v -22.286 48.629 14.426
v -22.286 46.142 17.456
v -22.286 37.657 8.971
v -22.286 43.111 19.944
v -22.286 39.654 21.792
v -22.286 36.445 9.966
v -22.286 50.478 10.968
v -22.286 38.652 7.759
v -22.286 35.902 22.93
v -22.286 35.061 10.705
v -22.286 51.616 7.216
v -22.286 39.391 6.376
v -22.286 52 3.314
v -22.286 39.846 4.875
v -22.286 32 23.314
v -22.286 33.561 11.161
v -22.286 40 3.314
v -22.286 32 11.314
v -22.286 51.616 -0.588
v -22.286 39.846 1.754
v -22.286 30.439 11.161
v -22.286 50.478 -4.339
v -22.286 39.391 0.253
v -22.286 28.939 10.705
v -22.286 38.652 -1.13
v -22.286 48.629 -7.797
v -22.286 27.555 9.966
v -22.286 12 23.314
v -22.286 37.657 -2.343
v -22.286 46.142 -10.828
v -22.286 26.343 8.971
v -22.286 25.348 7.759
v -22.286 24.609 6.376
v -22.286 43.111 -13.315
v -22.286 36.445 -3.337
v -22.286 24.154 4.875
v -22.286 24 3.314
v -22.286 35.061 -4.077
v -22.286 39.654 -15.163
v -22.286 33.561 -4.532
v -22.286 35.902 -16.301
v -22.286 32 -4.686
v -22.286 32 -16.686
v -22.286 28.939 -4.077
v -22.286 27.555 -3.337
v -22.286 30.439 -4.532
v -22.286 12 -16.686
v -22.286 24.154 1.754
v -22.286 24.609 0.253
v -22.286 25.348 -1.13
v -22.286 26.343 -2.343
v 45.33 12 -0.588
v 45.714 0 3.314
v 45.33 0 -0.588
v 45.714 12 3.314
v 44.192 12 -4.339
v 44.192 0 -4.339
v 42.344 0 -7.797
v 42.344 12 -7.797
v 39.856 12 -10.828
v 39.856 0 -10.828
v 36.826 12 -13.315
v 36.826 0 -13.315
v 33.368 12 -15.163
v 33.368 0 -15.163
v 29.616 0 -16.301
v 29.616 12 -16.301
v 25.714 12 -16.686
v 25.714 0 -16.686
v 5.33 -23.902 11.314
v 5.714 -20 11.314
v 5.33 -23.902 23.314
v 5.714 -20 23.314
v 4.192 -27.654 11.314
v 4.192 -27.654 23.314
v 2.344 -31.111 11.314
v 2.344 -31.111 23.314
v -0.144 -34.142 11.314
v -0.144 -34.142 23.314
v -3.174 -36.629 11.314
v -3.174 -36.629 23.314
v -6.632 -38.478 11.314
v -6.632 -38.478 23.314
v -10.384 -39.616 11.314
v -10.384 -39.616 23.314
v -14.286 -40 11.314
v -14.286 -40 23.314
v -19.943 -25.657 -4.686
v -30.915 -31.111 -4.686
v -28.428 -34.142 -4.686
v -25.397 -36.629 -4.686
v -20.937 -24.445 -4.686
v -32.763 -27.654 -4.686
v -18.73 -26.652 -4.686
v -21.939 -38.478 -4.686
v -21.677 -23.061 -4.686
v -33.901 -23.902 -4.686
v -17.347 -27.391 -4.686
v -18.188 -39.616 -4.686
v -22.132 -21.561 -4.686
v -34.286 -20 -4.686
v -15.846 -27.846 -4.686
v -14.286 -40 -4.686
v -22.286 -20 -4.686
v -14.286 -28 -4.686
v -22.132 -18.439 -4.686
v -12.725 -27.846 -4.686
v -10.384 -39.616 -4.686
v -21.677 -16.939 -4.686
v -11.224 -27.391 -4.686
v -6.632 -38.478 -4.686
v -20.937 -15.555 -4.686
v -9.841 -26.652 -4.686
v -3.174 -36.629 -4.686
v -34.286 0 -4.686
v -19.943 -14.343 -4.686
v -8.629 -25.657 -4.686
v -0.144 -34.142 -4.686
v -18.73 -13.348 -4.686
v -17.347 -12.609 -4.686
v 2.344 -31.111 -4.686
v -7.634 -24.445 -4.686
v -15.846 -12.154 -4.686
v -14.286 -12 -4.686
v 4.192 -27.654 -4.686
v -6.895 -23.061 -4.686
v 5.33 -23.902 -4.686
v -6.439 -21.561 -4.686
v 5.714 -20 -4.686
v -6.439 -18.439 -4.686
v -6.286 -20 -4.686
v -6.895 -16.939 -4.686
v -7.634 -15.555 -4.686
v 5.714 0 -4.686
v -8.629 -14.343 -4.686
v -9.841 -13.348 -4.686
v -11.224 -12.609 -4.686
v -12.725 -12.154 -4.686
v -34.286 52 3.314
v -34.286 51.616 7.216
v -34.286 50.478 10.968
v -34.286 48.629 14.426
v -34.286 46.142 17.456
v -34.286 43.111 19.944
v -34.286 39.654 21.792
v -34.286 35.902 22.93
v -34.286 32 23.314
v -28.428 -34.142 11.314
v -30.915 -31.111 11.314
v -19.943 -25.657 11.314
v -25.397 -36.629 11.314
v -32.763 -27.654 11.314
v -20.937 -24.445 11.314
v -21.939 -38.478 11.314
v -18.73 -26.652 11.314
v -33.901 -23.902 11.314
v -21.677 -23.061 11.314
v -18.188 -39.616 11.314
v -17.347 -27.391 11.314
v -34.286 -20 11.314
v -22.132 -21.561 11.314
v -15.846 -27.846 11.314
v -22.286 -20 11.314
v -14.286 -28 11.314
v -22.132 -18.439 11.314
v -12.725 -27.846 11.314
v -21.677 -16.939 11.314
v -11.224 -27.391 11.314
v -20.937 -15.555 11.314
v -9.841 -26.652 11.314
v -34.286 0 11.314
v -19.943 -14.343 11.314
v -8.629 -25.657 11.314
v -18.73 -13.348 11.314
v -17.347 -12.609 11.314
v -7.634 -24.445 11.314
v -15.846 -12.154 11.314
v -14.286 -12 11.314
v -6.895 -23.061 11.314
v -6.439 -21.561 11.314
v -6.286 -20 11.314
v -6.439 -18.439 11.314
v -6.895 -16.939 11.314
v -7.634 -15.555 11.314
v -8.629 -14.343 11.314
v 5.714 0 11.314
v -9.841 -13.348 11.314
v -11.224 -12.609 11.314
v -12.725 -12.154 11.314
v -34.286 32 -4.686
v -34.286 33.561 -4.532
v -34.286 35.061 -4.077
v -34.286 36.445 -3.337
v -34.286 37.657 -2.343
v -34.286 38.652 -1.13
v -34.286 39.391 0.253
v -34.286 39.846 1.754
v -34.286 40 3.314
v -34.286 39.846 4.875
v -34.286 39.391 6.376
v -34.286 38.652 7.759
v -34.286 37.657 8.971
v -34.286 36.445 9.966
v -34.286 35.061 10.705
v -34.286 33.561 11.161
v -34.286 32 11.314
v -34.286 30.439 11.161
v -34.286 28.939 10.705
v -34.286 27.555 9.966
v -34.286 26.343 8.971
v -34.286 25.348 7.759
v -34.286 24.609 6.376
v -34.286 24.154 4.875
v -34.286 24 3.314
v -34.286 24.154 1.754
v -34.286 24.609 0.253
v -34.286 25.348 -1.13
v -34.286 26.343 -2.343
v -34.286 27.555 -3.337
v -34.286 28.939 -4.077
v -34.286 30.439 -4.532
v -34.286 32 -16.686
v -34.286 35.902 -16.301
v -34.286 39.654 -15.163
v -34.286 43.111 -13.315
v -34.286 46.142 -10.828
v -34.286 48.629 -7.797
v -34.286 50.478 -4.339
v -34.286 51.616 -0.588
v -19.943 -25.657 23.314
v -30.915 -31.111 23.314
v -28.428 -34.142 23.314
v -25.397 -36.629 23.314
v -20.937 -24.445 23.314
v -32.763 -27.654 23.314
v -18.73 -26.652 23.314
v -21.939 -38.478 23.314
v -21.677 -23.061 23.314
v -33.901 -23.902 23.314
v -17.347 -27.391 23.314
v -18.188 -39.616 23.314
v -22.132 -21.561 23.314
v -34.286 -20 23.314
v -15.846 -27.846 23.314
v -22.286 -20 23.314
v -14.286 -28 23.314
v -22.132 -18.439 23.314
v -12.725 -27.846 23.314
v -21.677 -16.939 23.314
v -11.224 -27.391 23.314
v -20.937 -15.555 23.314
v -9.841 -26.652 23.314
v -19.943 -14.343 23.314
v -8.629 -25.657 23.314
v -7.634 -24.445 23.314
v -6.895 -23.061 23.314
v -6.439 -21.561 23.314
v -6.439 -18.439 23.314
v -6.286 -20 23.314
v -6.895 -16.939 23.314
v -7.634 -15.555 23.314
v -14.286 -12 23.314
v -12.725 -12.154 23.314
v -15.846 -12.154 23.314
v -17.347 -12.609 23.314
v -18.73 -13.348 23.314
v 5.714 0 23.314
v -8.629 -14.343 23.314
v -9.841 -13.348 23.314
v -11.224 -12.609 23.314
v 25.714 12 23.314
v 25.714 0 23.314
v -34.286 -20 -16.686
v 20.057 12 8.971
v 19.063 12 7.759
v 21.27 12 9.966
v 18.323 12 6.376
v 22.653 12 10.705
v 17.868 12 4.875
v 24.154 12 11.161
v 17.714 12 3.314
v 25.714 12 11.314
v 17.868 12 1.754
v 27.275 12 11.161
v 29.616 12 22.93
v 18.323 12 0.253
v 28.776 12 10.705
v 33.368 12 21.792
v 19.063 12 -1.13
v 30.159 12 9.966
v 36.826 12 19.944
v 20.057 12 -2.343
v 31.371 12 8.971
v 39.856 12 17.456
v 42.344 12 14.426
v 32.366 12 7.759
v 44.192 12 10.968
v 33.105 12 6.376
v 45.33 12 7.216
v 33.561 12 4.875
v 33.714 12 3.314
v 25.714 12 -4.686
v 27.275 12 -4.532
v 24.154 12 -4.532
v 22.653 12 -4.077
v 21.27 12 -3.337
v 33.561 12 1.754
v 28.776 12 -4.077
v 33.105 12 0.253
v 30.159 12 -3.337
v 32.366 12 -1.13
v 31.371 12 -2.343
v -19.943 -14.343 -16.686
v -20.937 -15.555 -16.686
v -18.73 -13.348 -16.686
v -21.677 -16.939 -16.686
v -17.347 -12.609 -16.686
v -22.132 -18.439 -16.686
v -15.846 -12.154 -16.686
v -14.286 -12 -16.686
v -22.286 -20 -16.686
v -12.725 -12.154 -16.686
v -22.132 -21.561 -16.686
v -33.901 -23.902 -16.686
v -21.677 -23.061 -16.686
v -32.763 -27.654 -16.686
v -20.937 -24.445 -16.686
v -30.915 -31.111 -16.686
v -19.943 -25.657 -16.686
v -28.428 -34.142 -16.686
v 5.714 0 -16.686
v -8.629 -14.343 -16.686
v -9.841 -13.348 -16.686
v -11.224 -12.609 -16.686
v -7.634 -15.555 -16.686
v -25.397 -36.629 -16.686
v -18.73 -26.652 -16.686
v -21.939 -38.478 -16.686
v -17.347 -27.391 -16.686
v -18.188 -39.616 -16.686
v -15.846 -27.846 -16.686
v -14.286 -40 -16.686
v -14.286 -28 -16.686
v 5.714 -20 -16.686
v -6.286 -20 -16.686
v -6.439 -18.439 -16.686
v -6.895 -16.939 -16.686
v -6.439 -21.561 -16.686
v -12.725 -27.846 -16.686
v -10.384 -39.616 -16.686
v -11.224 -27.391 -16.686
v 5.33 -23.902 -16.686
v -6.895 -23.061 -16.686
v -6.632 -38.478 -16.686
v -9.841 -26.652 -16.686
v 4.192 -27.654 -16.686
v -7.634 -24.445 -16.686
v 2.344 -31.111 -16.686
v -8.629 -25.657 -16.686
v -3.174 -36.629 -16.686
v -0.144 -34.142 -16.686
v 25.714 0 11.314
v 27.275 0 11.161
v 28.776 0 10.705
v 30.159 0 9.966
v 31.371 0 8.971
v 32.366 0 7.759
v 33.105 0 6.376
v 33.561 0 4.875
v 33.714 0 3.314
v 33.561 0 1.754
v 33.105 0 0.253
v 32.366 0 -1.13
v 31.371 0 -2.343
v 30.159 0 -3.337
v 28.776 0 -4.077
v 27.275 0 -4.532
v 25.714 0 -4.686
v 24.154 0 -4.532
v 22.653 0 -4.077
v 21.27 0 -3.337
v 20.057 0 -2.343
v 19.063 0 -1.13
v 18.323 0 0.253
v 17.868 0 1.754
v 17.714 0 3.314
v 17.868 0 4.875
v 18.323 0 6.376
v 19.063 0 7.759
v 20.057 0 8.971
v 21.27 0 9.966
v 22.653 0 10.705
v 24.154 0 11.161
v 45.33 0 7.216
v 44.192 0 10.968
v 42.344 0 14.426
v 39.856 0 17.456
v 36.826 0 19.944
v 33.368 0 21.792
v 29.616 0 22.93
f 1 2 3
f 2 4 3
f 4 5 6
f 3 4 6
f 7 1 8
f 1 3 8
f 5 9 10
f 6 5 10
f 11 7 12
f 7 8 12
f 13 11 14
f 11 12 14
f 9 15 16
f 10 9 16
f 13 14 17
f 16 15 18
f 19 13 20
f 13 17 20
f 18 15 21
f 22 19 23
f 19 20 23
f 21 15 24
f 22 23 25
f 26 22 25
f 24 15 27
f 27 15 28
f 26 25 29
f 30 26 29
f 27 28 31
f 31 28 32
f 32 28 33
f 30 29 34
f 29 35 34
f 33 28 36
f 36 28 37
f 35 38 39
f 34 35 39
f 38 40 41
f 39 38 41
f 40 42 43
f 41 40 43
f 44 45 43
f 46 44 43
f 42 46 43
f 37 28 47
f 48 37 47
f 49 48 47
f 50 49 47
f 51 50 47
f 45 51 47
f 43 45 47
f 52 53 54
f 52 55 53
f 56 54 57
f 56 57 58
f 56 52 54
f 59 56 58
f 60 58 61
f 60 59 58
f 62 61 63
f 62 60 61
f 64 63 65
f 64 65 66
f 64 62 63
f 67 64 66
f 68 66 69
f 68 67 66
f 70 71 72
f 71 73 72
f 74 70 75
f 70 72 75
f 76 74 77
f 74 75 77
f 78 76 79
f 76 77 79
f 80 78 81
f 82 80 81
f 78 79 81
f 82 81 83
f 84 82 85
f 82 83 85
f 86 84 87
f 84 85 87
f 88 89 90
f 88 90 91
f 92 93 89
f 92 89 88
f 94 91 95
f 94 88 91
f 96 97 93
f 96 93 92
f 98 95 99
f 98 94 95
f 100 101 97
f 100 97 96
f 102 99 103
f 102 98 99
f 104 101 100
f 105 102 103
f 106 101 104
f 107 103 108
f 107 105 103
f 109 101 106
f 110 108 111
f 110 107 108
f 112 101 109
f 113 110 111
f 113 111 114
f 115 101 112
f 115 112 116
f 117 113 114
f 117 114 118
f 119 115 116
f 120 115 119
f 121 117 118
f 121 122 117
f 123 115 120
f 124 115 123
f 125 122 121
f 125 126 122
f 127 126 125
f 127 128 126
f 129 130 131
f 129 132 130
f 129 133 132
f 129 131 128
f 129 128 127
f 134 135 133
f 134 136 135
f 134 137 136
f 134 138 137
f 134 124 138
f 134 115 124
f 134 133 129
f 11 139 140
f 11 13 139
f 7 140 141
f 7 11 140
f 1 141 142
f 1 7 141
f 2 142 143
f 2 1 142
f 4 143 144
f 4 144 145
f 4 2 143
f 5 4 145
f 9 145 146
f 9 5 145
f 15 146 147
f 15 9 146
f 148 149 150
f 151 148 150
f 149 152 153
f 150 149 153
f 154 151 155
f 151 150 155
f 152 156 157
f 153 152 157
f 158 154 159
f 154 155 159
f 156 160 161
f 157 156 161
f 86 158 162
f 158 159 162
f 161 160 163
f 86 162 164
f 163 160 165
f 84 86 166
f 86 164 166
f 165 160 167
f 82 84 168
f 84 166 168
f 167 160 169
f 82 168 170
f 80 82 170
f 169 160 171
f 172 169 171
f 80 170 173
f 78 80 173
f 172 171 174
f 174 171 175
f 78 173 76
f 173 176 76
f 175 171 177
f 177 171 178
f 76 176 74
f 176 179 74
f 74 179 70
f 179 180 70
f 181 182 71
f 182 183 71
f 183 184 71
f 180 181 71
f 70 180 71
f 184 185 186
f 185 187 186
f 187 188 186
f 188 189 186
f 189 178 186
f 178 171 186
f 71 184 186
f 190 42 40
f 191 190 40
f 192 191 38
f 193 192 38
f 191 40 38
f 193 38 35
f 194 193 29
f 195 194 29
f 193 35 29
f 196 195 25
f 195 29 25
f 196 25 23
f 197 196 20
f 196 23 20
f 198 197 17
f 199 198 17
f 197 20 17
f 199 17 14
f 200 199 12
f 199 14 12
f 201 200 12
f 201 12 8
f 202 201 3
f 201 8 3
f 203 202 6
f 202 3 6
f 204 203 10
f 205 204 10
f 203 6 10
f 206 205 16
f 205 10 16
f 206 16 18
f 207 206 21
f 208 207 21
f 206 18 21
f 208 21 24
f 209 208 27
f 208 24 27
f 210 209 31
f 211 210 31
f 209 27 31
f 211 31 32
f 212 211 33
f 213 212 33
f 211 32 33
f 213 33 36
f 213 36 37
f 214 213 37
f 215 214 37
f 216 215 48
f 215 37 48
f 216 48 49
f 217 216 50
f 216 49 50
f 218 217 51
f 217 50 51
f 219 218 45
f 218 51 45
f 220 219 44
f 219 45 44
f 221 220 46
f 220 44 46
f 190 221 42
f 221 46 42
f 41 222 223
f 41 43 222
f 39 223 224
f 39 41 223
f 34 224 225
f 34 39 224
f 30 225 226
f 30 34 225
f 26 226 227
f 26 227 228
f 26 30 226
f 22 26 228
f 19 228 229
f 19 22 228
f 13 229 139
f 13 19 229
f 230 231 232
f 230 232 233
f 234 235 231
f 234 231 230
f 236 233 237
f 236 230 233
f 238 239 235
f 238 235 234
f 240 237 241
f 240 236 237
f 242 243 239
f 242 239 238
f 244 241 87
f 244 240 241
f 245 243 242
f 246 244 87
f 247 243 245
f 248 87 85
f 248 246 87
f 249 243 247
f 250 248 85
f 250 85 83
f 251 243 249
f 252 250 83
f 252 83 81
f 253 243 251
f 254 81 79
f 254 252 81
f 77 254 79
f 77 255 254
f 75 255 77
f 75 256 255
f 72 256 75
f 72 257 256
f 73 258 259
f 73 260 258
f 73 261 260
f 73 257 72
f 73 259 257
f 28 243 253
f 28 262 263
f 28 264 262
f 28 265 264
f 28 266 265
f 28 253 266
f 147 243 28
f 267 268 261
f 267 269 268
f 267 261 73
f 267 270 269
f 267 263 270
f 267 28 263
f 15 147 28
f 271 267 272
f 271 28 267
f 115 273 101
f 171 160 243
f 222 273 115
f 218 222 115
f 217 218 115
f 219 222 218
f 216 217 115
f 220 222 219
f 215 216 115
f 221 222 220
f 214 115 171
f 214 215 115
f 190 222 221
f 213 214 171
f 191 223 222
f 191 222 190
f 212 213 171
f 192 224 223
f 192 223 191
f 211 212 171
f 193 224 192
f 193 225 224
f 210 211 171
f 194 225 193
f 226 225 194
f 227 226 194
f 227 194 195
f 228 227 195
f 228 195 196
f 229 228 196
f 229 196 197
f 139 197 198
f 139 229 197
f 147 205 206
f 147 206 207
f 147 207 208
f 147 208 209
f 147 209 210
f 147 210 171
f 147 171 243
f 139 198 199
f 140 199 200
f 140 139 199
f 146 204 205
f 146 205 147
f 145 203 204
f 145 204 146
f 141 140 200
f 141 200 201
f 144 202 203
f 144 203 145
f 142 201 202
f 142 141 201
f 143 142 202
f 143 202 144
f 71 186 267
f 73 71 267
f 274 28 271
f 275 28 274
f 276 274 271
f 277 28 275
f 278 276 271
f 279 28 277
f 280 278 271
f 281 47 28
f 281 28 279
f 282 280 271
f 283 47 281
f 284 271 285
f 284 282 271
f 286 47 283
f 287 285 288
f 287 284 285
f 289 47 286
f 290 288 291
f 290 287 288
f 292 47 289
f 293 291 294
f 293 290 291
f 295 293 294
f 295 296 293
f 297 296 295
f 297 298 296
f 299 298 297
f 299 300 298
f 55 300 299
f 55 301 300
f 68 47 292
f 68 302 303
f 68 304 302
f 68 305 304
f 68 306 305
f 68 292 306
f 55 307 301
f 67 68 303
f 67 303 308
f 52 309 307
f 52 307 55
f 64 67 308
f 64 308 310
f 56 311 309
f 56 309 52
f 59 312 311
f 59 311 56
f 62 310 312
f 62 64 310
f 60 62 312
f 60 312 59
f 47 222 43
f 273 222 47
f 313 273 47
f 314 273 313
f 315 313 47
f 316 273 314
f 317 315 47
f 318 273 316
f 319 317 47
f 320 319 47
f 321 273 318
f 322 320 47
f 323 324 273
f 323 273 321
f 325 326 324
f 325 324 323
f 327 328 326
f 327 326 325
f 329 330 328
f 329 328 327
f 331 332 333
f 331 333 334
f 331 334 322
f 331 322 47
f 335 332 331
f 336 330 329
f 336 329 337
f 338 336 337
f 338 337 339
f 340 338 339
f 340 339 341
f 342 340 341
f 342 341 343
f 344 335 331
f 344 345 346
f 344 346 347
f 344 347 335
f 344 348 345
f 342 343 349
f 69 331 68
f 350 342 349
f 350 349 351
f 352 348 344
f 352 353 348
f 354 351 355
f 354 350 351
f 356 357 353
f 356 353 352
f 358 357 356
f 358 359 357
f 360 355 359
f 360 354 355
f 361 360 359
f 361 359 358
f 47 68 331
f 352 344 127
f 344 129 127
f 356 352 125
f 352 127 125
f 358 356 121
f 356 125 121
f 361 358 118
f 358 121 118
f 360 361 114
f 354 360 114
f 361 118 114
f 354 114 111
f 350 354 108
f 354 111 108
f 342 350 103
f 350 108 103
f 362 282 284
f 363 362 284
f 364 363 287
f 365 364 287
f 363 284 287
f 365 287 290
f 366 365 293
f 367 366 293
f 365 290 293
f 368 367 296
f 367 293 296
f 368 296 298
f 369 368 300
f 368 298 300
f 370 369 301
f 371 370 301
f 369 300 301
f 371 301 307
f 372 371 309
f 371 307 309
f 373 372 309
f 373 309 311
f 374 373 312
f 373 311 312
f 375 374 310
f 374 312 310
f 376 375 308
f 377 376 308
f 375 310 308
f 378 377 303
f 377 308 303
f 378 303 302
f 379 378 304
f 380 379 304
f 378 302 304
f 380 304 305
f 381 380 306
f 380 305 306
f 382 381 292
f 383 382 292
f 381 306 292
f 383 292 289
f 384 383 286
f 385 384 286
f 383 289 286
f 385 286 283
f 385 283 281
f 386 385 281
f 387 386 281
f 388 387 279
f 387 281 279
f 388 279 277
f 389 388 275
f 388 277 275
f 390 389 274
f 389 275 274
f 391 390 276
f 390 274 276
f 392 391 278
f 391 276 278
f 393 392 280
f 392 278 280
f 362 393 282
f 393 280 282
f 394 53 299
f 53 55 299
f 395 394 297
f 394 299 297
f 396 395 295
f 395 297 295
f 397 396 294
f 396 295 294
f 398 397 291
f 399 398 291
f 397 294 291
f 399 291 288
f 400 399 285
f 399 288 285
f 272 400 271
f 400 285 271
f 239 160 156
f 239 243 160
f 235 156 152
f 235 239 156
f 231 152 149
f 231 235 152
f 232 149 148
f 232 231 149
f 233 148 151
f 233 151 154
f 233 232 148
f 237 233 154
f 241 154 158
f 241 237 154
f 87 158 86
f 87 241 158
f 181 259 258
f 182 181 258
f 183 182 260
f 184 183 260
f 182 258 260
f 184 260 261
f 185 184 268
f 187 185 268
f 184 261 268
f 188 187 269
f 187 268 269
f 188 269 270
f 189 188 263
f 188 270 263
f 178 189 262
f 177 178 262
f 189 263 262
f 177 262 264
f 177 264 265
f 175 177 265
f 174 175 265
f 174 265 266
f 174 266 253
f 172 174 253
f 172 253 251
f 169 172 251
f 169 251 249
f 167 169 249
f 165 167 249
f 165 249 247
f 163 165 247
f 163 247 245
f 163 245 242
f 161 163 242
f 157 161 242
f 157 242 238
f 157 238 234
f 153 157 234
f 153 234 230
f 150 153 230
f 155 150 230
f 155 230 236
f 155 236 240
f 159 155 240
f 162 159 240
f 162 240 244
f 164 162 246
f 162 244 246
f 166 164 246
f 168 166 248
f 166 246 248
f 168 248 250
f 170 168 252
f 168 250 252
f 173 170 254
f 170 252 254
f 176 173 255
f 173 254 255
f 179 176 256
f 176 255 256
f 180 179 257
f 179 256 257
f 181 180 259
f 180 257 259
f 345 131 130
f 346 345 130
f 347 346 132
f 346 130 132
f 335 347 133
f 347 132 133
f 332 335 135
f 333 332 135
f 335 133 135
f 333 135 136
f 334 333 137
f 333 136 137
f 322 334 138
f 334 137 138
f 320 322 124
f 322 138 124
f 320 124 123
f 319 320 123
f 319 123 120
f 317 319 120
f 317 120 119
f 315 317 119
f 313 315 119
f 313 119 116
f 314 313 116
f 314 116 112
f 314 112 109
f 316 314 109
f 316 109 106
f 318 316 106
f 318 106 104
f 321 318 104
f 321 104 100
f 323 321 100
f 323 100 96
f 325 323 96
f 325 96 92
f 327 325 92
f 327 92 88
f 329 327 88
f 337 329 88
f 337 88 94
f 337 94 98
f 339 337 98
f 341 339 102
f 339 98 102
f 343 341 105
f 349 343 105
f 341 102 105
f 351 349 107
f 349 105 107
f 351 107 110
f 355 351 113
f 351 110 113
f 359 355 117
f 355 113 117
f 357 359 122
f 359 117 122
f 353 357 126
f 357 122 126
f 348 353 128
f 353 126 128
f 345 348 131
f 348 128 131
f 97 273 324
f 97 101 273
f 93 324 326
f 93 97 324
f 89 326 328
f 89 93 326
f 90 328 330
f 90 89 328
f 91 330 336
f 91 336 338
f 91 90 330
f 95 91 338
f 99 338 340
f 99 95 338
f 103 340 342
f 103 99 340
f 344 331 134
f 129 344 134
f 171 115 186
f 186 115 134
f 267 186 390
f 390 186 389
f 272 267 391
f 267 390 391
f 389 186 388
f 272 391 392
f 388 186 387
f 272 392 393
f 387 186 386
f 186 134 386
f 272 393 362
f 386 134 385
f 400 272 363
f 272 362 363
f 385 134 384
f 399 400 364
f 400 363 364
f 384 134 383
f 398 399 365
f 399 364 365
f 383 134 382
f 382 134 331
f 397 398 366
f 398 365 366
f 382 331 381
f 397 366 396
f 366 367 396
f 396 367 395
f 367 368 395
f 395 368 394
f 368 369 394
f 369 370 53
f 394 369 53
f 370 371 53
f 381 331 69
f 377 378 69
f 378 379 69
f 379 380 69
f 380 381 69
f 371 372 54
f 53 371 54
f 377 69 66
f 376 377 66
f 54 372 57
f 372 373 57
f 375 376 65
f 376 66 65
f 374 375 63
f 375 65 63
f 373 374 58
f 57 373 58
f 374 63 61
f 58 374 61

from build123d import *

# Parameters (mm, degrees)
SKETCH1_W           = 80
SKETCH1_H           = 40
BOSS_EXTRUDE1_DEPTH = 12
SKETCH2_W           = 12
SKETCH2_H           = 40
BOSS_EXTRUDE2_DEPTH = 40
SKETCH3_W           = 40
SKETCH3_H           = 12
BOSS_EXTRUDE3_DEPTH = 40
FILLET1_R           = 20
SKETCH4_R           = 8
CUT_EXTRUDE1_DEPTH  = 12
SKETCH5_R           = 8
CUT_EXTRUDE2_DEPTH  = 12
SKETCH6_R           = 8
CUT_EXTRUDE3_DEPTH  = 80.961215088


with BuildPart() as part:
    # Sketch1 → Boss-Extrude1 (new body)
    with BuildSketch(Plane(origin=(0, 0, 0), x_dir=(1, 0, 0), z_dir=(0, 1, 0))):
        with Locations((5.714285714, -3.314285714)):
            Rectangle(SKETCH1_W, SKETCH1_H)
    extrude(amount=BOSS_EXTRUDE1_DEPTH)

    # Sketch2 → Boss-Extrude2 (add)
    with BuildSketch(Plane(origin=(0, 12, 0), x_dir=(1, 0, 0), z_dir=(0, 1, 0))):
        with Locations((-28.285714286, -3.314285714)):
            Rectangle(SKETCH2_W, SKETCH2_H)
    extrude(amount=BOSS_EXTRUDE2_DEPTH)

    # Sketch3 → Boss-Extrude3 (add)
    with BuildSketch(Plane.XZ):
        with Locations((-14.285714286, 17.314285714)):
            Rectangle(SKETCH3_W, SKETCH3_H)
        with Locations((-14.285714286, -10.685714286)):
            Rectangle(SKETCH3_W, SKETCH3_H)
    extrude(amount=BOSS_EXTRUDE3_DEPTH)

    # Fillet1
    fillet1_edges = [part.edges().sort_by_distance(p)[0] for p in [
        (-34.285714286, -40, -10.685714286),
        (-34.285714286, -40, 17.314285714),
        (5.714285714, -40, -10.685714286),
        (5.714285714, -40, 17.314285714),
        (45.714285714, 6, -16.685714286),
        (45.714285714, 6, 23.314285714),
        (-28.285714286, 52, -16.685714286),
        (-28.285714286, 52, 23.314285714),
    ]]
    fillet(fillet1_edges, radius=FILLET1_R - 0.0001)  # a hair under: the kernel refuses the full size

    # Sketch4 → Cut-Extrude1 (cut)
    with BuildSketch(Plane(origin=(-22.285714286, 0, 0), x_dir=(0, 0, -1), z_dir=(1, 0, 0))):
        with Locations((-3.314285714, 32)):
            Circle(SKETCH4_R)
    extrude(amount=-CUT_EXTRUDE1_DEPTH, mode=Mode.SUBTRACT)

    # Sketch5 → Cut-Extrude2 (cut)
    with BuildSketch(Plane(origin=(0, 12, 0), x_dir=(1, 0, 0), z_dir=(0, 1, 0))):
        with Locations(Location((25.714285714, -3.314285714, 0), (0, 0, 270))):
            Circle(SKETCH5_R)
    extrude(amount=-CUT_EXTRUDE2_DEPTH, mode=Mode.SUBTRACT)

    # Sketch6 → Cut-Extrude3 (cut, through all)
    with BuildSketch(Plane.XY.offset(23.314285714)):
        with Locations((-14.285714286, -20)):
            Circle(SKETCH6_R)
    extrude(amount=-CUT_EXTRUDE3_DEPTH, mode=Mode.SUBTRACT)


solid = part.part
